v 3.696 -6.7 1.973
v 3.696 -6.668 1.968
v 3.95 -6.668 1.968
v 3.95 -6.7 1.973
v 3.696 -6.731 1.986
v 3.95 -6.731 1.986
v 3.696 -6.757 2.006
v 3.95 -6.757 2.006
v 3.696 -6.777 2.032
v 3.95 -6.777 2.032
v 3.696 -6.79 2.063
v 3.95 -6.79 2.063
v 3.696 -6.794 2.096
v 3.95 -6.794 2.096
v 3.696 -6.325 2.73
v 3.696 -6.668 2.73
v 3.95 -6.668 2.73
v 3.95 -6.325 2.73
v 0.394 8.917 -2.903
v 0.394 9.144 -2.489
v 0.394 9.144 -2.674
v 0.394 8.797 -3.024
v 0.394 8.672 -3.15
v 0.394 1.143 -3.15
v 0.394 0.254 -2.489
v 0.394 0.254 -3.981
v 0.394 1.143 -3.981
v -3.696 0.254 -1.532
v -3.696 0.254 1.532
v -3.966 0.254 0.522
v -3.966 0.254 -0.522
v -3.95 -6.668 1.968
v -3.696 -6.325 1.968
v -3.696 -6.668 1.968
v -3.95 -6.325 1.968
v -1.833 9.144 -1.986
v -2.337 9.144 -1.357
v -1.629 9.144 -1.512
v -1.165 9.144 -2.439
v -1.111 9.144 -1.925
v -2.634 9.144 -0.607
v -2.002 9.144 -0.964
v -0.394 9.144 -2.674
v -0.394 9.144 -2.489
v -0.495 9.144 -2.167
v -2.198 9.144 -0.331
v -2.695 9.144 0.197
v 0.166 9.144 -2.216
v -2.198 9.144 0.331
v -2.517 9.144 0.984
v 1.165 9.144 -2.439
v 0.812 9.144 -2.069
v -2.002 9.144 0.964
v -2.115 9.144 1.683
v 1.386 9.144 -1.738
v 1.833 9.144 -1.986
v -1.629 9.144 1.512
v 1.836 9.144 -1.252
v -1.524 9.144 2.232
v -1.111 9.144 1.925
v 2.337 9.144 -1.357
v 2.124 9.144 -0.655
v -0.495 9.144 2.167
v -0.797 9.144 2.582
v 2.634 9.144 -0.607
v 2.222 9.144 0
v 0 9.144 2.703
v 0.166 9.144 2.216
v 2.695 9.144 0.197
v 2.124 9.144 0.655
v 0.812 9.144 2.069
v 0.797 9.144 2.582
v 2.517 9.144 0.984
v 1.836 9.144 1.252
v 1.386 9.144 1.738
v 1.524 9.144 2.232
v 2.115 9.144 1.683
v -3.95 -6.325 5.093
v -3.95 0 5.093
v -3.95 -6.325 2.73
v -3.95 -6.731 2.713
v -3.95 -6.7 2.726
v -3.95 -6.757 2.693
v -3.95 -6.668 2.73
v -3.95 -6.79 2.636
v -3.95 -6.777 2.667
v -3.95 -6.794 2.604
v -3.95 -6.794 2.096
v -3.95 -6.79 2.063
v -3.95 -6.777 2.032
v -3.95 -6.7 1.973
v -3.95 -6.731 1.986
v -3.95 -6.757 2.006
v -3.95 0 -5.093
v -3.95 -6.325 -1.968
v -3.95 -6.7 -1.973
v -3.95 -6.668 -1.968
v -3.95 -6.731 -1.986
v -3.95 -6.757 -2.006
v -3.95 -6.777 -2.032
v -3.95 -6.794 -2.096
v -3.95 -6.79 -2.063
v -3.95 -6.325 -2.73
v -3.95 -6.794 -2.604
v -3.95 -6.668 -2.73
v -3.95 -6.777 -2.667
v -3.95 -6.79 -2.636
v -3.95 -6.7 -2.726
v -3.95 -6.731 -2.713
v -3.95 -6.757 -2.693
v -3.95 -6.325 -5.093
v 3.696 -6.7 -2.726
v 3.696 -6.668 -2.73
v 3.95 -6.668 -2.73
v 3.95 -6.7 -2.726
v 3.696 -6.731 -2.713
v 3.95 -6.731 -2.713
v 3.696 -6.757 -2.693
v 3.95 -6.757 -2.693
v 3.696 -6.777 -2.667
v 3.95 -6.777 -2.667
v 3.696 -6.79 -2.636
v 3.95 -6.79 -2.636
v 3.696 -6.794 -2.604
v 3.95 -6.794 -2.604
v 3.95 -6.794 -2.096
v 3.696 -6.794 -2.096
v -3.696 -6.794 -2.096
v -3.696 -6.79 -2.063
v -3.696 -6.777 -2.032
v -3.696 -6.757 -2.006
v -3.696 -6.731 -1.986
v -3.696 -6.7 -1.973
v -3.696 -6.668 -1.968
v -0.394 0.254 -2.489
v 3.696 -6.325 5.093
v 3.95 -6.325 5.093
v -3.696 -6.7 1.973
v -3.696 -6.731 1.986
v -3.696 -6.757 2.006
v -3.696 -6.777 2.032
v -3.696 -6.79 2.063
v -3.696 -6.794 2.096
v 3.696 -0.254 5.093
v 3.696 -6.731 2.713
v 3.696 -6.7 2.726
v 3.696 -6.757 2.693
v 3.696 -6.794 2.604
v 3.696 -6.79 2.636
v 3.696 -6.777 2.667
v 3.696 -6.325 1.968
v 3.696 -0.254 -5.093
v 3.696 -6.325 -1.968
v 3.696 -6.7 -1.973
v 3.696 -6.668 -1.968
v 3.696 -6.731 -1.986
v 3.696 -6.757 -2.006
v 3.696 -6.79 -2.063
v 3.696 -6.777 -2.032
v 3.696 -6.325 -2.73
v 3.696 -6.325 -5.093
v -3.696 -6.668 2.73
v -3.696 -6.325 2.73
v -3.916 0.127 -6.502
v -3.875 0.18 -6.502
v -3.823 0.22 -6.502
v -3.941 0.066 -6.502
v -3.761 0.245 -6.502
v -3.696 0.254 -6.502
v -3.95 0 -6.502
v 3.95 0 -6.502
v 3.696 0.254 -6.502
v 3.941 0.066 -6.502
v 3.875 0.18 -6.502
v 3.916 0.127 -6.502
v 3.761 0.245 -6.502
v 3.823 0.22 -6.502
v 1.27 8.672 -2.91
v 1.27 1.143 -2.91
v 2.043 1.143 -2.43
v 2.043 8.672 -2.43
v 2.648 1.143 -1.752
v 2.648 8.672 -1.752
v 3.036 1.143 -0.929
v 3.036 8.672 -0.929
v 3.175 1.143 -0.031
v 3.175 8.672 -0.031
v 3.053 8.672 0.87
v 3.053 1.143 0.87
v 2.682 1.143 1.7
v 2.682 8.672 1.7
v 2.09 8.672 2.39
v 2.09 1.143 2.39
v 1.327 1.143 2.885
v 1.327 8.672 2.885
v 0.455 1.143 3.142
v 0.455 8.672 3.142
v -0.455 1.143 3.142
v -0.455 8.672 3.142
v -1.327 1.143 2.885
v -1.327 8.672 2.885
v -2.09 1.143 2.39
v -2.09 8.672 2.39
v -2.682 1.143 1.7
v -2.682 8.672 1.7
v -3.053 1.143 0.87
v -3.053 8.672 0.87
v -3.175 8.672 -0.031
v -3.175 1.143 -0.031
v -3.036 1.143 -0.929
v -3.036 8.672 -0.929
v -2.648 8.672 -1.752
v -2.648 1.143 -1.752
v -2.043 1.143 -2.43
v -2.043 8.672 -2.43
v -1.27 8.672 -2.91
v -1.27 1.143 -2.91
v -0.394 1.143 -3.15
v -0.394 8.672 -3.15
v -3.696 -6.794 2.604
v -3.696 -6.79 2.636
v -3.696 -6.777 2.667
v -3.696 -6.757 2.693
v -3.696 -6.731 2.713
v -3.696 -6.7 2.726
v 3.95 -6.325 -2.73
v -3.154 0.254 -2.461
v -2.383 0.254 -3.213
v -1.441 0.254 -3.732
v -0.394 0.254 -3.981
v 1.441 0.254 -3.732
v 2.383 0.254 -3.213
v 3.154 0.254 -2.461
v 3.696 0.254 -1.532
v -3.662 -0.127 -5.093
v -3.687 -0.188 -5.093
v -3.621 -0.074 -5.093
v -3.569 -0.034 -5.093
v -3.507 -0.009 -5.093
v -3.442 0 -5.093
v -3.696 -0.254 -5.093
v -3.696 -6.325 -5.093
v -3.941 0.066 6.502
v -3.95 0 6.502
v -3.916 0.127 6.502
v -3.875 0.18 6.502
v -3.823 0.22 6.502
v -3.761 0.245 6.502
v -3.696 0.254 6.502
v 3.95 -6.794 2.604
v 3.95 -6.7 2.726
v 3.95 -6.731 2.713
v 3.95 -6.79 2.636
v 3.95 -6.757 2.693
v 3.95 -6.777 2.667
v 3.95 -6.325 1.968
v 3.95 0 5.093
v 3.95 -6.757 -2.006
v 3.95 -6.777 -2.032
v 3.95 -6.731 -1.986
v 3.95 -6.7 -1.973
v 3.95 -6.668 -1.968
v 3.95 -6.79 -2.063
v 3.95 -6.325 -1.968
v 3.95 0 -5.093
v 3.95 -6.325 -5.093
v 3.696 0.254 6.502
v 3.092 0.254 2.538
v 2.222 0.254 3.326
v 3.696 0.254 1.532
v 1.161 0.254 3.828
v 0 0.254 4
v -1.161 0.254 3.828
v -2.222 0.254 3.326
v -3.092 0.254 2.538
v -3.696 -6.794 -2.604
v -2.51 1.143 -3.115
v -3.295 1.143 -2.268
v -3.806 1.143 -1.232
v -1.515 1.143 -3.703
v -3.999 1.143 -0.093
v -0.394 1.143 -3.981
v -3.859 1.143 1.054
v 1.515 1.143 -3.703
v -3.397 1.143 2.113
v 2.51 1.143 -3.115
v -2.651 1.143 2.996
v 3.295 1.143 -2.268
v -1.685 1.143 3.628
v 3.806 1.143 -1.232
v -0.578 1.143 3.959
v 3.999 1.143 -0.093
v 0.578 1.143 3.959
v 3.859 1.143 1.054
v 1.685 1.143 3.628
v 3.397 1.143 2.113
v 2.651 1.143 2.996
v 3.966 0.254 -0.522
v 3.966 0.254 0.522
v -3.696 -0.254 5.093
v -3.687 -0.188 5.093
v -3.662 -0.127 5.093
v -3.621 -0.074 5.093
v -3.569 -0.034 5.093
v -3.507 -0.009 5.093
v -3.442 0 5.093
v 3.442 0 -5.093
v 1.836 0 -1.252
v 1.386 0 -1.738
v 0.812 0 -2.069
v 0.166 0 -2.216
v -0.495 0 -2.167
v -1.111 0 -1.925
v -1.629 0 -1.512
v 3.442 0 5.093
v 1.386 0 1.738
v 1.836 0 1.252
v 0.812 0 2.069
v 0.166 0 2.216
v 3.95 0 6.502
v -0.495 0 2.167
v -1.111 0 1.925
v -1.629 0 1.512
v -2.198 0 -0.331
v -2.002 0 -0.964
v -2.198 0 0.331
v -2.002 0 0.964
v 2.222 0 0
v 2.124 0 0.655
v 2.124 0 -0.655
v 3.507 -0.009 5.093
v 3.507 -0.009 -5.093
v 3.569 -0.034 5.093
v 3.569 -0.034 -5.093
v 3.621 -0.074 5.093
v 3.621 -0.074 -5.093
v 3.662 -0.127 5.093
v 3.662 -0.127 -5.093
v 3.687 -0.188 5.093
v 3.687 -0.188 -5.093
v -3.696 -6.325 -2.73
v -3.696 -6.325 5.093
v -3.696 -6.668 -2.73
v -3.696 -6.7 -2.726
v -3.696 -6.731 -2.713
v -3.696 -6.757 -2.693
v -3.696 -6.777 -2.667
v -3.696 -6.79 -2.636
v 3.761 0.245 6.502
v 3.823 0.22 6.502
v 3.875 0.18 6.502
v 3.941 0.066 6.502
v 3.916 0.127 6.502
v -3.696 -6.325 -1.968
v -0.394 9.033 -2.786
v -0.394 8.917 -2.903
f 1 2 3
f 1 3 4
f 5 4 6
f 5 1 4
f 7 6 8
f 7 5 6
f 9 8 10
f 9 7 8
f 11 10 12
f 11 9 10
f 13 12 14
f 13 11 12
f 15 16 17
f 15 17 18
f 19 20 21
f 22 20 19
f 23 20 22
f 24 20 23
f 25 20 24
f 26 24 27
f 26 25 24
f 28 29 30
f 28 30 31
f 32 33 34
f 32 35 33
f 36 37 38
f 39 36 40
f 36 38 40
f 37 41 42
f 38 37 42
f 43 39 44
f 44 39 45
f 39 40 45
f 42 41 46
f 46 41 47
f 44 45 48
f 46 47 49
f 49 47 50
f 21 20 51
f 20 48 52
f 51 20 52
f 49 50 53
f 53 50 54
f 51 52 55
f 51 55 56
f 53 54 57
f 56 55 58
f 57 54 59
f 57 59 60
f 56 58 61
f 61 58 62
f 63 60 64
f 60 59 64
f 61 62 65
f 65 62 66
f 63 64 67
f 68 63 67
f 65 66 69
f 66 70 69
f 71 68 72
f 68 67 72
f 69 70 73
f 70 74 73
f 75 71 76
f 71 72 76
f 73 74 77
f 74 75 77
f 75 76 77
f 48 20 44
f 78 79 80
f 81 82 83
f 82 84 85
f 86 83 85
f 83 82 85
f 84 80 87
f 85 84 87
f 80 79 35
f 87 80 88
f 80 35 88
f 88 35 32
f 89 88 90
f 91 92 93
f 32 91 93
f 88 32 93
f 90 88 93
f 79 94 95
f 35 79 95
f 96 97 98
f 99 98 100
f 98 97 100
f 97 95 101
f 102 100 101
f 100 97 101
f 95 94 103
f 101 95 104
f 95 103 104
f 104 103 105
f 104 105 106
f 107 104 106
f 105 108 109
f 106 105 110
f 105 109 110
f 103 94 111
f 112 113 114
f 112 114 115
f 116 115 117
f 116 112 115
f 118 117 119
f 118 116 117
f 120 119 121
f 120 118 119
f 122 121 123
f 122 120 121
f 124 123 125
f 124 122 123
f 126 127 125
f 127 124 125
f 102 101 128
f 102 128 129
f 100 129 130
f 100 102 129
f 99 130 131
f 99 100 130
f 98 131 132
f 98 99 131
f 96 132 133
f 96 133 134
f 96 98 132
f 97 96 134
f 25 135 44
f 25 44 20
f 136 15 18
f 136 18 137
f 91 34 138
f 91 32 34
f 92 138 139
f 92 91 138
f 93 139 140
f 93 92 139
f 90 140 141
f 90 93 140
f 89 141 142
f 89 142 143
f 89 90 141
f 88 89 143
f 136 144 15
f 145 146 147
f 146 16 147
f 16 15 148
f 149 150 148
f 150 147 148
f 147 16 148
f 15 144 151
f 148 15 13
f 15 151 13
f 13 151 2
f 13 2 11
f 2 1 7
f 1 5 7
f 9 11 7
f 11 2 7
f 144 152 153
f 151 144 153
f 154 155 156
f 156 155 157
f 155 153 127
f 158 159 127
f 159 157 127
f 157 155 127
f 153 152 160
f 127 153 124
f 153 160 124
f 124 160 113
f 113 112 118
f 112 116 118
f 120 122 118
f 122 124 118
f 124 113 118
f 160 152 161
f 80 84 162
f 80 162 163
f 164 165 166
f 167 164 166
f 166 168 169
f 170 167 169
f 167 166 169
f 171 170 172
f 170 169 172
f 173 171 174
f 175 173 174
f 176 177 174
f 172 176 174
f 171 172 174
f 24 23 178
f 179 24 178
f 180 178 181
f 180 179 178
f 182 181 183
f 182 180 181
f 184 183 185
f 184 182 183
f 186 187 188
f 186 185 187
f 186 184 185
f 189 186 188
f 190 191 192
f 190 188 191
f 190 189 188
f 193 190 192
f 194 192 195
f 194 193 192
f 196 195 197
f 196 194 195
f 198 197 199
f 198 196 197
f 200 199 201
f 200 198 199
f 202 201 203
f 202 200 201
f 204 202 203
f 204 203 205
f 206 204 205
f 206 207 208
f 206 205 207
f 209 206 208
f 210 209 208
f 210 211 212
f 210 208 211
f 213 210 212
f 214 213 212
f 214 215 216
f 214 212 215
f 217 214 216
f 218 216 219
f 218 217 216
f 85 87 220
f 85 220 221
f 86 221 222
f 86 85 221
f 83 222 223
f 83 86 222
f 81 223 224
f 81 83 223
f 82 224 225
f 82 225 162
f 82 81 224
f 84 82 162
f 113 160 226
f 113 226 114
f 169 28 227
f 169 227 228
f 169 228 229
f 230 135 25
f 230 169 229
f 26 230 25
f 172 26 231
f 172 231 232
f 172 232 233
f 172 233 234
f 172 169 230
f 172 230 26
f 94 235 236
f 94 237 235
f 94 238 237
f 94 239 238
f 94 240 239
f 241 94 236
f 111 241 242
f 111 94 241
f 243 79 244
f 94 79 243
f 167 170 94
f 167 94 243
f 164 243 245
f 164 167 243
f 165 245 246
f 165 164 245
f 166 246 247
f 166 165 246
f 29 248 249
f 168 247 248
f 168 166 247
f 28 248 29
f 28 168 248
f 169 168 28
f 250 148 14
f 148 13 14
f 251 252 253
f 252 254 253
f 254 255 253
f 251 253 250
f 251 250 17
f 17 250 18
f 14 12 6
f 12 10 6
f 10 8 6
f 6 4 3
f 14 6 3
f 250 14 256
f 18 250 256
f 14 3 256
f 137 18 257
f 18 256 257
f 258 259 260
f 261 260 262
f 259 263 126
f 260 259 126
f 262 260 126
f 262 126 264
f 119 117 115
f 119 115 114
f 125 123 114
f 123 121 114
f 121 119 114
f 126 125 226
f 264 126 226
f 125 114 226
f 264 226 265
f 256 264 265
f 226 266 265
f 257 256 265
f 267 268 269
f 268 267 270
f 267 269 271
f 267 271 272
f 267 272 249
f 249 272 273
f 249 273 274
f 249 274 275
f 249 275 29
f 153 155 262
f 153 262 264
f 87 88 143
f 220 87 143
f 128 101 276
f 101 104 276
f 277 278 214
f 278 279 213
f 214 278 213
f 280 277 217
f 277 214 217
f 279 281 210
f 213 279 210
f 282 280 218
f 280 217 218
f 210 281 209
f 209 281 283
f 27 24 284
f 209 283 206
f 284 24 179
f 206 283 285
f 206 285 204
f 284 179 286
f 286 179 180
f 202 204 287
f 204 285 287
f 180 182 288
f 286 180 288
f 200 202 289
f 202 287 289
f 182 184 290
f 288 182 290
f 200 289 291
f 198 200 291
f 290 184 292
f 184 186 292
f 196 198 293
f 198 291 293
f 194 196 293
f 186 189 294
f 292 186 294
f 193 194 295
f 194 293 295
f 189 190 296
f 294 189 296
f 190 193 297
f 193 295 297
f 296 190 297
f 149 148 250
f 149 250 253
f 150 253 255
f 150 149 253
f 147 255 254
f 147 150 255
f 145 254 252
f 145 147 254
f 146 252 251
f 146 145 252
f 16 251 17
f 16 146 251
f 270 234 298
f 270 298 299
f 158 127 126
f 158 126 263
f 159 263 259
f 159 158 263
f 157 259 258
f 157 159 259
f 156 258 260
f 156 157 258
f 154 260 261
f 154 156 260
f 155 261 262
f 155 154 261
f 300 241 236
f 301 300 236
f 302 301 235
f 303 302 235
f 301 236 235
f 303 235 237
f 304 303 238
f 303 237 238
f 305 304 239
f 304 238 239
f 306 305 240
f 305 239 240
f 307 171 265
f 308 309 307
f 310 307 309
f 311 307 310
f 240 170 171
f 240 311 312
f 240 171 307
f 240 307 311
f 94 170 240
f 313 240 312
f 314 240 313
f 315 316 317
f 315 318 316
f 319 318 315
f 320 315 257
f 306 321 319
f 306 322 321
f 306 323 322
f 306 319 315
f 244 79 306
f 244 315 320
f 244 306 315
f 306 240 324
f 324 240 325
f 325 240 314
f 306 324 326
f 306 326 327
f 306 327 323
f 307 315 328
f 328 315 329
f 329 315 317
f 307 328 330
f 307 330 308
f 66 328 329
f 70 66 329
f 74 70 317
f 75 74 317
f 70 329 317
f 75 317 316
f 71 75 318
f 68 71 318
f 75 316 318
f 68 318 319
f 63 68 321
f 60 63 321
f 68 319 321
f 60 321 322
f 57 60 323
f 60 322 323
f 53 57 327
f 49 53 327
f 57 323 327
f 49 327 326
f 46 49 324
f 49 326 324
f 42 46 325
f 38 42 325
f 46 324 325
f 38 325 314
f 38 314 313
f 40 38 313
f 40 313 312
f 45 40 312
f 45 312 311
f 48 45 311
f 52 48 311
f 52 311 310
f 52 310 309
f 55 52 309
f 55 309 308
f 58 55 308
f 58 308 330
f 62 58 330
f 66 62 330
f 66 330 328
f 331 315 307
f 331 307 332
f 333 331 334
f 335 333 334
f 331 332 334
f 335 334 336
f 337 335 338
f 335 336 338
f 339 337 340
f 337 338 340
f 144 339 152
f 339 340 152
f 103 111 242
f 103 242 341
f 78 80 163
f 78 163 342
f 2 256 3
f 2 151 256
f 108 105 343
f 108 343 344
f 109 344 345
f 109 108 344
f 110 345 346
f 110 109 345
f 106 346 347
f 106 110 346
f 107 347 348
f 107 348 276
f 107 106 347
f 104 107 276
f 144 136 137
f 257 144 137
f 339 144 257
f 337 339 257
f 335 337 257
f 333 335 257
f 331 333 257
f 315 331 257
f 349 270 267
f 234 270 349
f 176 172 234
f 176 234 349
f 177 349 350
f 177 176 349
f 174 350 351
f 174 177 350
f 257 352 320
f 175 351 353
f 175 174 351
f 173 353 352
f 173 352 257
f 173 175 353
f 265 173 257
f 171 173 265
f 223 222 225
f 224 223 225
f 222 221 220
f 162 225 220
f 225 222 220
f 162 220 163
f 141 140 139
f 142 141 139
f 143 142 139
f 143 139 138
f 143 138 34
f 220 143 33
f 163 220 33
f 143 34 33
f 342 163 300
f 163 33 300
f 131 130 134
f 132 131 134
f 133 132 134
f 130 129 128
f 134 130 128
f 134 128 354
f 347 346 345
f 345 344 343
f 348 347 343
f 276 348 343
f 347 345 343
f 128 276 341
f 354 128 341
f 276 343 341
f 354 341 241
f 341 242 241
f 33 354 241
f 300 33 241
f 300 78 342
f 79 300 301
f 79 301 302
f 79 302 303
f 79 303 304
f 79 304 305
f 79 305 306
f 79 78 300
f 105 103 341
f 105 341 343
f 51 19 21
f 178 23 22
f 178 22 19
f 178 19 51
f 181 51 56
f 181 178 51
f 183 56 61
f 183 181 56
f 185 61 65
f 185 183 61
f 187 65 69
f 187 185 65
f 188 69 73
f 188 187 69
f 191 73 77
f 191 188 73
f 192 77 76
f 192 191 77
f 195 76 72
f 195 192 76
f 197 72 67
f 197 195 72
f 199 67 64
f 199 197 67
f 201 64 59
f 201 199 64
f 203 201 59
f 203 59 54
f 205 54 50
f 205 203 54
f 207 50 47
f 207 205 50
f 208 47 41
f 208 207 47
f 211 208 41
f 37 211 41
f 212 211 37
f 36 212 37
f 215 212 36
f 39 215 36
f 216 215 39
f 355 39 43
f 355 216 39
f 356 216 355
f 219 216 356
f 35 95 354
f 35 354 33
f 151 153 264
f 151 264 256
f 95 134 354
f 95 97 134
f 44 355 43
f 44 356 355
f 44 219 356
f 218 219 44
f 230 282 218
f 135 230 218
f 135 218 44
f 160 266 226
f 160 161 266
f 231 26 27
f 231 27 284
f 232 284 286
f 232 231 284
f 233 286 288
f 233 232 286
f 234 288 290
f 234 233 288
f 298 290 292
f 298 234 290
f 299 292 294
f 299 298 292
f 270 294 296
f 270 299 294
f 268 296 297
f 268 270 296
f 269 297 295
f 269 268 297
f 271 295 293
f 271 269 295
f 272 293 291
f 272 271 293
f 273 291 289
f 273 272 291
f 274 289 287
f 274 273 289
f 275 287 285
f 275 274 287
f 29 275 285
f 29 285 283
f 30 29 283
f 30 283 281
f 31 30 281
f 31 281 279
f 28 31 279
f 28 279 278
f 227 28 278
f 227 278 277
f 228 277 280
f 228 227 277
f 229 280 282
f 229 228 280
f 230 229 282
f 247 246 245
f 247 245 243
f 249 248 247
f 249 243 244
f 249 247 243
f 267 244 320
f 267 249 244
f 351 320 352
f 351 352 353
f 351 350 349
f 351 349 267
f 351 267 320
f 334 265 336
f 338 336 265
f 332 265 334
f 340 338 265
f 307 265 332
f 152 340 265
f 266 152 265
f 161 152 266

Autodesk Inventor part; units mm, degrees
sketch "Sketch_1" plane through (0, 0, 0) normal (0, 0, 1) x (1, 0, 0)
  line L0 (-3.9497, 0) -> (-3.9497, -6.7945)
  line L1 (-3.9497, -6.7945) -> (-3.6957, -6.7945)
  line L2 (-3.6957, -6.7945) -> (-3.6957, -0.254)
  arc A0 (-3.4417, 0) -> (-3.6957, -0.254) centre (-3.4417, -0.254) ccw
  line L3 (-3.4417, 0) -> (3.4417, 0)
  arc A1 (3.6957, -0.254) -> (3.4417, 0) centre (3.4417, -0.254) ccw
  line L4 (3.6957, -0.254) -> (3.6957, -6.7945)
  line L5 (3.6957, -6.7945) -> (3.9497, -6.7945)
  line L6 (3.9497, -6.7945) -> (3.9497, 0)
  arc A2 (3.9497, 0) -> (3.6957, 0.254) centre (3.6957, 0) ccw
  line L7 (3.6957, 0.254) -> (-3.6957, 0.254)
  arc A3 (-3.6957, 0.254) -> (-3.9497, 0) centre (-3.6957, 0) ccw
extrude "Extrusion1" add sketch "Sketch_1" along normal mid plane 13.0048
sketch "Sketch_2" plane through (0, 0, 0) normal (1, 0, 0) x (0, 1, 0)
  line L0 (0, 7.8029) -> (-9.398, 7.8029)
  line L1 (-9.398, 7.8029) -> (-9.398, -7.8029)
  line L2 (-9.398, -7.8029) -> (0, -7.8029)
  line L3 (0, -7.8029) -> (0, -5.0927)
  line L4 (0, -5.0927) -> (-6.3246, -5.0927)
  line L5 (-6.3246, -5.0927) -> (-6.3246, -2.7305)
  line L6 (-6.3246, -2.7305) -> (-6.6675, -2.7305)
  arc A0 (-6.7945, -2.6035) -> (-6.6675, -2.7305) centre (-6.6675, -2.6035) ccw
  line L7 (-6.7945, -2.6035) -> (-6.7945, -2.0955)
  arc A1 (-6.6675, -1.9685) -> (-6.7945, -2.0955) centre (-6.6675, -2.0955) ccw
  line L8 (-6.6675, -1.9685) -> (-6.3246, -1.9685)
  line L9 (-6.3246, -1.9685) -> (-6.3246, 1.9685)
  line L10 (-6.3246, 1.9685) -> (-6.6675, 1.9685)
  arc A2 (-6.7945, 2.0955) -> (-6.6675, 1.9685) centre (-6.6675, 2.0955) ccw
  line L11 (-6.7945, 2.0955) -> (-6.7945, 2.6035)
  arc A3 (-6.6675, 2.7305) -> (-6.7945, 2.6035) centre (-6.6675, 2.6035) ccw
  line L12 (-6.6675, 2.7305) -> (-6.3246, 2.7305)
  line L13 (-6.3246, 2.7305) -> (-6.3246, 5.0927)
  line L14 (-6.3246, 5.0927) -> (0, 5.0927)
  line L15 (0, 5.0927) -> (0, 7.8029)
extrude "Extrusion2" cut sketch "Sketch_2" along normal mid plane 7.8994
sketch "Sketch_15" plane through (0, 0, 0) normal (0, 0, 1) x (1, 0, 0)
  line L0 (0, 0.127) -> (0, 9.144)
  line L1 (0, 9.144) -> (2.7026, 9.144)
  line L2 (2.7026, 9.144) -> (3.175, 8.6716)
  line L3 (3.175, 8.6716) -> (3.175, 1.143)
  line L4 (3.175, 1.143) -> (4.0005, 1.143)
  line L5 (4.0005, 1.143) -> (4.0005, 0.254)
  line L6 (4.0005, 0.254) -> (2.2225, 0.254)
  line L7 (2.2225, 0.254) -> (2.2225, 0.127)
  line L8 (2.2225, 0.127) -> (0, 0.127)
  line L9 (0, 0.127) -> (0, 9.144)
revolve "Revolution1" add sketch "Sketch_15" angle 360 about axis through (0, 0.127, 0) along (0, -1, 0)
thread "Thread1" size "1/4-32 UNEF" class "3A" standard "ANSI Unified Screw Threads" length 7.239 offset 0.762
sketch "Sketch_8" plane through (0, 0.254, 0) normal (0, 1, 0) x (1, 0, 0)
  line L0 (-0.3937, 2.4892) -> (0.3937, 2.4892)
  line L1 (0.3937, 2.4892) -> (0.3937, 10.4902)
  line L2 (0.3937, 10.4902) -> (-0.3937, 10.4902)
  line L3 (-0.3937, 10.4902) -> (-0.3937, 2.4892)
extrude "Extrusion3" cut sketch "Sketch_8" along normal blind 9.779
sketch "Sketch_10_ALT_Drilling_1" plane through (0, 0, 0) normal (0, 0, 1) x (1, 0, 0)
  line L0 (0, 0) -> (0, 9.144)
  line L1 (0, 9.144) -> (2.2225, 9.144)
  line L2 (2.2225, 9.144) -> (2.2225, 0)
  line L3 (2.2225, 0) -> (0, 0)
  line L4 (0, 0) -> (0, 9.144)
revolve "Revolution2" cut sketch "Sketch_10_ALT_Drilling_1" angle 360 about axis through (0, 0, 0) along (0, -1, 0)
ref_plane "1_XY" through (0, 7.112, 0) normal (0, 1, 0) x (1, 0, 0)
ref_plane "1_YZ" through (0, 7.112, 0) normal (1, 0, 0) x (0, 0, -1)
ref_plane "1_ZX" through (0, 7.112, 0) normal (0, 0, -1) x (0, 1, 0)
ref_plane "2_XY" through (0, 5.334, 0) normal (0, 1, 0) x (1, 0, 0)
ref_plane "2_YZ" through (0, 5.334, 0) normal (1, 0, 0) x (0, 0, -1)
ref_plane "2_ZX" through (0, 5.334, 0) normal (0, 0, -1) x (0, 1, 0)
ref_plane "3_XY" through (0, 3.556, 0) normal (0, 1, 0) x (1, 0, 0)
ref_plane "3_YZ" through (0, 3.556, 0) normal (1, 0, 0) x (0, 0, -1)
ref_plane "3_ZX" through (0, 3.556, 0) normal (0, 0, -1) x (0, 1, 0)
ref_plane "4_XY" through (0, 2.2225, 0) normal (0, 1, 0) x (1, 0, 0)
ref_plane "4_YZ" through (0, 2.2225, 0) normal (1, 0, 0) x (0, 0, -1)
ref_plane "4_ZX" through (0, 2.2225, 0) normal (0, 0, -1) x (0, 1, 0)
ref_plane "to_base_XY" through (0, 0, 0) normal (0, 1, 0) x (1, 0, 0)
ref_plane "to_base_YZ" through (0, 0, 0) normal (1, 0, 0) x (0, 0, -1)
ref_plane "to_base_ZX" through (0, 0, 0) normal (0, 0, -1) x (0, 1, 0)
properties part number "M201S1M201-bushing"
